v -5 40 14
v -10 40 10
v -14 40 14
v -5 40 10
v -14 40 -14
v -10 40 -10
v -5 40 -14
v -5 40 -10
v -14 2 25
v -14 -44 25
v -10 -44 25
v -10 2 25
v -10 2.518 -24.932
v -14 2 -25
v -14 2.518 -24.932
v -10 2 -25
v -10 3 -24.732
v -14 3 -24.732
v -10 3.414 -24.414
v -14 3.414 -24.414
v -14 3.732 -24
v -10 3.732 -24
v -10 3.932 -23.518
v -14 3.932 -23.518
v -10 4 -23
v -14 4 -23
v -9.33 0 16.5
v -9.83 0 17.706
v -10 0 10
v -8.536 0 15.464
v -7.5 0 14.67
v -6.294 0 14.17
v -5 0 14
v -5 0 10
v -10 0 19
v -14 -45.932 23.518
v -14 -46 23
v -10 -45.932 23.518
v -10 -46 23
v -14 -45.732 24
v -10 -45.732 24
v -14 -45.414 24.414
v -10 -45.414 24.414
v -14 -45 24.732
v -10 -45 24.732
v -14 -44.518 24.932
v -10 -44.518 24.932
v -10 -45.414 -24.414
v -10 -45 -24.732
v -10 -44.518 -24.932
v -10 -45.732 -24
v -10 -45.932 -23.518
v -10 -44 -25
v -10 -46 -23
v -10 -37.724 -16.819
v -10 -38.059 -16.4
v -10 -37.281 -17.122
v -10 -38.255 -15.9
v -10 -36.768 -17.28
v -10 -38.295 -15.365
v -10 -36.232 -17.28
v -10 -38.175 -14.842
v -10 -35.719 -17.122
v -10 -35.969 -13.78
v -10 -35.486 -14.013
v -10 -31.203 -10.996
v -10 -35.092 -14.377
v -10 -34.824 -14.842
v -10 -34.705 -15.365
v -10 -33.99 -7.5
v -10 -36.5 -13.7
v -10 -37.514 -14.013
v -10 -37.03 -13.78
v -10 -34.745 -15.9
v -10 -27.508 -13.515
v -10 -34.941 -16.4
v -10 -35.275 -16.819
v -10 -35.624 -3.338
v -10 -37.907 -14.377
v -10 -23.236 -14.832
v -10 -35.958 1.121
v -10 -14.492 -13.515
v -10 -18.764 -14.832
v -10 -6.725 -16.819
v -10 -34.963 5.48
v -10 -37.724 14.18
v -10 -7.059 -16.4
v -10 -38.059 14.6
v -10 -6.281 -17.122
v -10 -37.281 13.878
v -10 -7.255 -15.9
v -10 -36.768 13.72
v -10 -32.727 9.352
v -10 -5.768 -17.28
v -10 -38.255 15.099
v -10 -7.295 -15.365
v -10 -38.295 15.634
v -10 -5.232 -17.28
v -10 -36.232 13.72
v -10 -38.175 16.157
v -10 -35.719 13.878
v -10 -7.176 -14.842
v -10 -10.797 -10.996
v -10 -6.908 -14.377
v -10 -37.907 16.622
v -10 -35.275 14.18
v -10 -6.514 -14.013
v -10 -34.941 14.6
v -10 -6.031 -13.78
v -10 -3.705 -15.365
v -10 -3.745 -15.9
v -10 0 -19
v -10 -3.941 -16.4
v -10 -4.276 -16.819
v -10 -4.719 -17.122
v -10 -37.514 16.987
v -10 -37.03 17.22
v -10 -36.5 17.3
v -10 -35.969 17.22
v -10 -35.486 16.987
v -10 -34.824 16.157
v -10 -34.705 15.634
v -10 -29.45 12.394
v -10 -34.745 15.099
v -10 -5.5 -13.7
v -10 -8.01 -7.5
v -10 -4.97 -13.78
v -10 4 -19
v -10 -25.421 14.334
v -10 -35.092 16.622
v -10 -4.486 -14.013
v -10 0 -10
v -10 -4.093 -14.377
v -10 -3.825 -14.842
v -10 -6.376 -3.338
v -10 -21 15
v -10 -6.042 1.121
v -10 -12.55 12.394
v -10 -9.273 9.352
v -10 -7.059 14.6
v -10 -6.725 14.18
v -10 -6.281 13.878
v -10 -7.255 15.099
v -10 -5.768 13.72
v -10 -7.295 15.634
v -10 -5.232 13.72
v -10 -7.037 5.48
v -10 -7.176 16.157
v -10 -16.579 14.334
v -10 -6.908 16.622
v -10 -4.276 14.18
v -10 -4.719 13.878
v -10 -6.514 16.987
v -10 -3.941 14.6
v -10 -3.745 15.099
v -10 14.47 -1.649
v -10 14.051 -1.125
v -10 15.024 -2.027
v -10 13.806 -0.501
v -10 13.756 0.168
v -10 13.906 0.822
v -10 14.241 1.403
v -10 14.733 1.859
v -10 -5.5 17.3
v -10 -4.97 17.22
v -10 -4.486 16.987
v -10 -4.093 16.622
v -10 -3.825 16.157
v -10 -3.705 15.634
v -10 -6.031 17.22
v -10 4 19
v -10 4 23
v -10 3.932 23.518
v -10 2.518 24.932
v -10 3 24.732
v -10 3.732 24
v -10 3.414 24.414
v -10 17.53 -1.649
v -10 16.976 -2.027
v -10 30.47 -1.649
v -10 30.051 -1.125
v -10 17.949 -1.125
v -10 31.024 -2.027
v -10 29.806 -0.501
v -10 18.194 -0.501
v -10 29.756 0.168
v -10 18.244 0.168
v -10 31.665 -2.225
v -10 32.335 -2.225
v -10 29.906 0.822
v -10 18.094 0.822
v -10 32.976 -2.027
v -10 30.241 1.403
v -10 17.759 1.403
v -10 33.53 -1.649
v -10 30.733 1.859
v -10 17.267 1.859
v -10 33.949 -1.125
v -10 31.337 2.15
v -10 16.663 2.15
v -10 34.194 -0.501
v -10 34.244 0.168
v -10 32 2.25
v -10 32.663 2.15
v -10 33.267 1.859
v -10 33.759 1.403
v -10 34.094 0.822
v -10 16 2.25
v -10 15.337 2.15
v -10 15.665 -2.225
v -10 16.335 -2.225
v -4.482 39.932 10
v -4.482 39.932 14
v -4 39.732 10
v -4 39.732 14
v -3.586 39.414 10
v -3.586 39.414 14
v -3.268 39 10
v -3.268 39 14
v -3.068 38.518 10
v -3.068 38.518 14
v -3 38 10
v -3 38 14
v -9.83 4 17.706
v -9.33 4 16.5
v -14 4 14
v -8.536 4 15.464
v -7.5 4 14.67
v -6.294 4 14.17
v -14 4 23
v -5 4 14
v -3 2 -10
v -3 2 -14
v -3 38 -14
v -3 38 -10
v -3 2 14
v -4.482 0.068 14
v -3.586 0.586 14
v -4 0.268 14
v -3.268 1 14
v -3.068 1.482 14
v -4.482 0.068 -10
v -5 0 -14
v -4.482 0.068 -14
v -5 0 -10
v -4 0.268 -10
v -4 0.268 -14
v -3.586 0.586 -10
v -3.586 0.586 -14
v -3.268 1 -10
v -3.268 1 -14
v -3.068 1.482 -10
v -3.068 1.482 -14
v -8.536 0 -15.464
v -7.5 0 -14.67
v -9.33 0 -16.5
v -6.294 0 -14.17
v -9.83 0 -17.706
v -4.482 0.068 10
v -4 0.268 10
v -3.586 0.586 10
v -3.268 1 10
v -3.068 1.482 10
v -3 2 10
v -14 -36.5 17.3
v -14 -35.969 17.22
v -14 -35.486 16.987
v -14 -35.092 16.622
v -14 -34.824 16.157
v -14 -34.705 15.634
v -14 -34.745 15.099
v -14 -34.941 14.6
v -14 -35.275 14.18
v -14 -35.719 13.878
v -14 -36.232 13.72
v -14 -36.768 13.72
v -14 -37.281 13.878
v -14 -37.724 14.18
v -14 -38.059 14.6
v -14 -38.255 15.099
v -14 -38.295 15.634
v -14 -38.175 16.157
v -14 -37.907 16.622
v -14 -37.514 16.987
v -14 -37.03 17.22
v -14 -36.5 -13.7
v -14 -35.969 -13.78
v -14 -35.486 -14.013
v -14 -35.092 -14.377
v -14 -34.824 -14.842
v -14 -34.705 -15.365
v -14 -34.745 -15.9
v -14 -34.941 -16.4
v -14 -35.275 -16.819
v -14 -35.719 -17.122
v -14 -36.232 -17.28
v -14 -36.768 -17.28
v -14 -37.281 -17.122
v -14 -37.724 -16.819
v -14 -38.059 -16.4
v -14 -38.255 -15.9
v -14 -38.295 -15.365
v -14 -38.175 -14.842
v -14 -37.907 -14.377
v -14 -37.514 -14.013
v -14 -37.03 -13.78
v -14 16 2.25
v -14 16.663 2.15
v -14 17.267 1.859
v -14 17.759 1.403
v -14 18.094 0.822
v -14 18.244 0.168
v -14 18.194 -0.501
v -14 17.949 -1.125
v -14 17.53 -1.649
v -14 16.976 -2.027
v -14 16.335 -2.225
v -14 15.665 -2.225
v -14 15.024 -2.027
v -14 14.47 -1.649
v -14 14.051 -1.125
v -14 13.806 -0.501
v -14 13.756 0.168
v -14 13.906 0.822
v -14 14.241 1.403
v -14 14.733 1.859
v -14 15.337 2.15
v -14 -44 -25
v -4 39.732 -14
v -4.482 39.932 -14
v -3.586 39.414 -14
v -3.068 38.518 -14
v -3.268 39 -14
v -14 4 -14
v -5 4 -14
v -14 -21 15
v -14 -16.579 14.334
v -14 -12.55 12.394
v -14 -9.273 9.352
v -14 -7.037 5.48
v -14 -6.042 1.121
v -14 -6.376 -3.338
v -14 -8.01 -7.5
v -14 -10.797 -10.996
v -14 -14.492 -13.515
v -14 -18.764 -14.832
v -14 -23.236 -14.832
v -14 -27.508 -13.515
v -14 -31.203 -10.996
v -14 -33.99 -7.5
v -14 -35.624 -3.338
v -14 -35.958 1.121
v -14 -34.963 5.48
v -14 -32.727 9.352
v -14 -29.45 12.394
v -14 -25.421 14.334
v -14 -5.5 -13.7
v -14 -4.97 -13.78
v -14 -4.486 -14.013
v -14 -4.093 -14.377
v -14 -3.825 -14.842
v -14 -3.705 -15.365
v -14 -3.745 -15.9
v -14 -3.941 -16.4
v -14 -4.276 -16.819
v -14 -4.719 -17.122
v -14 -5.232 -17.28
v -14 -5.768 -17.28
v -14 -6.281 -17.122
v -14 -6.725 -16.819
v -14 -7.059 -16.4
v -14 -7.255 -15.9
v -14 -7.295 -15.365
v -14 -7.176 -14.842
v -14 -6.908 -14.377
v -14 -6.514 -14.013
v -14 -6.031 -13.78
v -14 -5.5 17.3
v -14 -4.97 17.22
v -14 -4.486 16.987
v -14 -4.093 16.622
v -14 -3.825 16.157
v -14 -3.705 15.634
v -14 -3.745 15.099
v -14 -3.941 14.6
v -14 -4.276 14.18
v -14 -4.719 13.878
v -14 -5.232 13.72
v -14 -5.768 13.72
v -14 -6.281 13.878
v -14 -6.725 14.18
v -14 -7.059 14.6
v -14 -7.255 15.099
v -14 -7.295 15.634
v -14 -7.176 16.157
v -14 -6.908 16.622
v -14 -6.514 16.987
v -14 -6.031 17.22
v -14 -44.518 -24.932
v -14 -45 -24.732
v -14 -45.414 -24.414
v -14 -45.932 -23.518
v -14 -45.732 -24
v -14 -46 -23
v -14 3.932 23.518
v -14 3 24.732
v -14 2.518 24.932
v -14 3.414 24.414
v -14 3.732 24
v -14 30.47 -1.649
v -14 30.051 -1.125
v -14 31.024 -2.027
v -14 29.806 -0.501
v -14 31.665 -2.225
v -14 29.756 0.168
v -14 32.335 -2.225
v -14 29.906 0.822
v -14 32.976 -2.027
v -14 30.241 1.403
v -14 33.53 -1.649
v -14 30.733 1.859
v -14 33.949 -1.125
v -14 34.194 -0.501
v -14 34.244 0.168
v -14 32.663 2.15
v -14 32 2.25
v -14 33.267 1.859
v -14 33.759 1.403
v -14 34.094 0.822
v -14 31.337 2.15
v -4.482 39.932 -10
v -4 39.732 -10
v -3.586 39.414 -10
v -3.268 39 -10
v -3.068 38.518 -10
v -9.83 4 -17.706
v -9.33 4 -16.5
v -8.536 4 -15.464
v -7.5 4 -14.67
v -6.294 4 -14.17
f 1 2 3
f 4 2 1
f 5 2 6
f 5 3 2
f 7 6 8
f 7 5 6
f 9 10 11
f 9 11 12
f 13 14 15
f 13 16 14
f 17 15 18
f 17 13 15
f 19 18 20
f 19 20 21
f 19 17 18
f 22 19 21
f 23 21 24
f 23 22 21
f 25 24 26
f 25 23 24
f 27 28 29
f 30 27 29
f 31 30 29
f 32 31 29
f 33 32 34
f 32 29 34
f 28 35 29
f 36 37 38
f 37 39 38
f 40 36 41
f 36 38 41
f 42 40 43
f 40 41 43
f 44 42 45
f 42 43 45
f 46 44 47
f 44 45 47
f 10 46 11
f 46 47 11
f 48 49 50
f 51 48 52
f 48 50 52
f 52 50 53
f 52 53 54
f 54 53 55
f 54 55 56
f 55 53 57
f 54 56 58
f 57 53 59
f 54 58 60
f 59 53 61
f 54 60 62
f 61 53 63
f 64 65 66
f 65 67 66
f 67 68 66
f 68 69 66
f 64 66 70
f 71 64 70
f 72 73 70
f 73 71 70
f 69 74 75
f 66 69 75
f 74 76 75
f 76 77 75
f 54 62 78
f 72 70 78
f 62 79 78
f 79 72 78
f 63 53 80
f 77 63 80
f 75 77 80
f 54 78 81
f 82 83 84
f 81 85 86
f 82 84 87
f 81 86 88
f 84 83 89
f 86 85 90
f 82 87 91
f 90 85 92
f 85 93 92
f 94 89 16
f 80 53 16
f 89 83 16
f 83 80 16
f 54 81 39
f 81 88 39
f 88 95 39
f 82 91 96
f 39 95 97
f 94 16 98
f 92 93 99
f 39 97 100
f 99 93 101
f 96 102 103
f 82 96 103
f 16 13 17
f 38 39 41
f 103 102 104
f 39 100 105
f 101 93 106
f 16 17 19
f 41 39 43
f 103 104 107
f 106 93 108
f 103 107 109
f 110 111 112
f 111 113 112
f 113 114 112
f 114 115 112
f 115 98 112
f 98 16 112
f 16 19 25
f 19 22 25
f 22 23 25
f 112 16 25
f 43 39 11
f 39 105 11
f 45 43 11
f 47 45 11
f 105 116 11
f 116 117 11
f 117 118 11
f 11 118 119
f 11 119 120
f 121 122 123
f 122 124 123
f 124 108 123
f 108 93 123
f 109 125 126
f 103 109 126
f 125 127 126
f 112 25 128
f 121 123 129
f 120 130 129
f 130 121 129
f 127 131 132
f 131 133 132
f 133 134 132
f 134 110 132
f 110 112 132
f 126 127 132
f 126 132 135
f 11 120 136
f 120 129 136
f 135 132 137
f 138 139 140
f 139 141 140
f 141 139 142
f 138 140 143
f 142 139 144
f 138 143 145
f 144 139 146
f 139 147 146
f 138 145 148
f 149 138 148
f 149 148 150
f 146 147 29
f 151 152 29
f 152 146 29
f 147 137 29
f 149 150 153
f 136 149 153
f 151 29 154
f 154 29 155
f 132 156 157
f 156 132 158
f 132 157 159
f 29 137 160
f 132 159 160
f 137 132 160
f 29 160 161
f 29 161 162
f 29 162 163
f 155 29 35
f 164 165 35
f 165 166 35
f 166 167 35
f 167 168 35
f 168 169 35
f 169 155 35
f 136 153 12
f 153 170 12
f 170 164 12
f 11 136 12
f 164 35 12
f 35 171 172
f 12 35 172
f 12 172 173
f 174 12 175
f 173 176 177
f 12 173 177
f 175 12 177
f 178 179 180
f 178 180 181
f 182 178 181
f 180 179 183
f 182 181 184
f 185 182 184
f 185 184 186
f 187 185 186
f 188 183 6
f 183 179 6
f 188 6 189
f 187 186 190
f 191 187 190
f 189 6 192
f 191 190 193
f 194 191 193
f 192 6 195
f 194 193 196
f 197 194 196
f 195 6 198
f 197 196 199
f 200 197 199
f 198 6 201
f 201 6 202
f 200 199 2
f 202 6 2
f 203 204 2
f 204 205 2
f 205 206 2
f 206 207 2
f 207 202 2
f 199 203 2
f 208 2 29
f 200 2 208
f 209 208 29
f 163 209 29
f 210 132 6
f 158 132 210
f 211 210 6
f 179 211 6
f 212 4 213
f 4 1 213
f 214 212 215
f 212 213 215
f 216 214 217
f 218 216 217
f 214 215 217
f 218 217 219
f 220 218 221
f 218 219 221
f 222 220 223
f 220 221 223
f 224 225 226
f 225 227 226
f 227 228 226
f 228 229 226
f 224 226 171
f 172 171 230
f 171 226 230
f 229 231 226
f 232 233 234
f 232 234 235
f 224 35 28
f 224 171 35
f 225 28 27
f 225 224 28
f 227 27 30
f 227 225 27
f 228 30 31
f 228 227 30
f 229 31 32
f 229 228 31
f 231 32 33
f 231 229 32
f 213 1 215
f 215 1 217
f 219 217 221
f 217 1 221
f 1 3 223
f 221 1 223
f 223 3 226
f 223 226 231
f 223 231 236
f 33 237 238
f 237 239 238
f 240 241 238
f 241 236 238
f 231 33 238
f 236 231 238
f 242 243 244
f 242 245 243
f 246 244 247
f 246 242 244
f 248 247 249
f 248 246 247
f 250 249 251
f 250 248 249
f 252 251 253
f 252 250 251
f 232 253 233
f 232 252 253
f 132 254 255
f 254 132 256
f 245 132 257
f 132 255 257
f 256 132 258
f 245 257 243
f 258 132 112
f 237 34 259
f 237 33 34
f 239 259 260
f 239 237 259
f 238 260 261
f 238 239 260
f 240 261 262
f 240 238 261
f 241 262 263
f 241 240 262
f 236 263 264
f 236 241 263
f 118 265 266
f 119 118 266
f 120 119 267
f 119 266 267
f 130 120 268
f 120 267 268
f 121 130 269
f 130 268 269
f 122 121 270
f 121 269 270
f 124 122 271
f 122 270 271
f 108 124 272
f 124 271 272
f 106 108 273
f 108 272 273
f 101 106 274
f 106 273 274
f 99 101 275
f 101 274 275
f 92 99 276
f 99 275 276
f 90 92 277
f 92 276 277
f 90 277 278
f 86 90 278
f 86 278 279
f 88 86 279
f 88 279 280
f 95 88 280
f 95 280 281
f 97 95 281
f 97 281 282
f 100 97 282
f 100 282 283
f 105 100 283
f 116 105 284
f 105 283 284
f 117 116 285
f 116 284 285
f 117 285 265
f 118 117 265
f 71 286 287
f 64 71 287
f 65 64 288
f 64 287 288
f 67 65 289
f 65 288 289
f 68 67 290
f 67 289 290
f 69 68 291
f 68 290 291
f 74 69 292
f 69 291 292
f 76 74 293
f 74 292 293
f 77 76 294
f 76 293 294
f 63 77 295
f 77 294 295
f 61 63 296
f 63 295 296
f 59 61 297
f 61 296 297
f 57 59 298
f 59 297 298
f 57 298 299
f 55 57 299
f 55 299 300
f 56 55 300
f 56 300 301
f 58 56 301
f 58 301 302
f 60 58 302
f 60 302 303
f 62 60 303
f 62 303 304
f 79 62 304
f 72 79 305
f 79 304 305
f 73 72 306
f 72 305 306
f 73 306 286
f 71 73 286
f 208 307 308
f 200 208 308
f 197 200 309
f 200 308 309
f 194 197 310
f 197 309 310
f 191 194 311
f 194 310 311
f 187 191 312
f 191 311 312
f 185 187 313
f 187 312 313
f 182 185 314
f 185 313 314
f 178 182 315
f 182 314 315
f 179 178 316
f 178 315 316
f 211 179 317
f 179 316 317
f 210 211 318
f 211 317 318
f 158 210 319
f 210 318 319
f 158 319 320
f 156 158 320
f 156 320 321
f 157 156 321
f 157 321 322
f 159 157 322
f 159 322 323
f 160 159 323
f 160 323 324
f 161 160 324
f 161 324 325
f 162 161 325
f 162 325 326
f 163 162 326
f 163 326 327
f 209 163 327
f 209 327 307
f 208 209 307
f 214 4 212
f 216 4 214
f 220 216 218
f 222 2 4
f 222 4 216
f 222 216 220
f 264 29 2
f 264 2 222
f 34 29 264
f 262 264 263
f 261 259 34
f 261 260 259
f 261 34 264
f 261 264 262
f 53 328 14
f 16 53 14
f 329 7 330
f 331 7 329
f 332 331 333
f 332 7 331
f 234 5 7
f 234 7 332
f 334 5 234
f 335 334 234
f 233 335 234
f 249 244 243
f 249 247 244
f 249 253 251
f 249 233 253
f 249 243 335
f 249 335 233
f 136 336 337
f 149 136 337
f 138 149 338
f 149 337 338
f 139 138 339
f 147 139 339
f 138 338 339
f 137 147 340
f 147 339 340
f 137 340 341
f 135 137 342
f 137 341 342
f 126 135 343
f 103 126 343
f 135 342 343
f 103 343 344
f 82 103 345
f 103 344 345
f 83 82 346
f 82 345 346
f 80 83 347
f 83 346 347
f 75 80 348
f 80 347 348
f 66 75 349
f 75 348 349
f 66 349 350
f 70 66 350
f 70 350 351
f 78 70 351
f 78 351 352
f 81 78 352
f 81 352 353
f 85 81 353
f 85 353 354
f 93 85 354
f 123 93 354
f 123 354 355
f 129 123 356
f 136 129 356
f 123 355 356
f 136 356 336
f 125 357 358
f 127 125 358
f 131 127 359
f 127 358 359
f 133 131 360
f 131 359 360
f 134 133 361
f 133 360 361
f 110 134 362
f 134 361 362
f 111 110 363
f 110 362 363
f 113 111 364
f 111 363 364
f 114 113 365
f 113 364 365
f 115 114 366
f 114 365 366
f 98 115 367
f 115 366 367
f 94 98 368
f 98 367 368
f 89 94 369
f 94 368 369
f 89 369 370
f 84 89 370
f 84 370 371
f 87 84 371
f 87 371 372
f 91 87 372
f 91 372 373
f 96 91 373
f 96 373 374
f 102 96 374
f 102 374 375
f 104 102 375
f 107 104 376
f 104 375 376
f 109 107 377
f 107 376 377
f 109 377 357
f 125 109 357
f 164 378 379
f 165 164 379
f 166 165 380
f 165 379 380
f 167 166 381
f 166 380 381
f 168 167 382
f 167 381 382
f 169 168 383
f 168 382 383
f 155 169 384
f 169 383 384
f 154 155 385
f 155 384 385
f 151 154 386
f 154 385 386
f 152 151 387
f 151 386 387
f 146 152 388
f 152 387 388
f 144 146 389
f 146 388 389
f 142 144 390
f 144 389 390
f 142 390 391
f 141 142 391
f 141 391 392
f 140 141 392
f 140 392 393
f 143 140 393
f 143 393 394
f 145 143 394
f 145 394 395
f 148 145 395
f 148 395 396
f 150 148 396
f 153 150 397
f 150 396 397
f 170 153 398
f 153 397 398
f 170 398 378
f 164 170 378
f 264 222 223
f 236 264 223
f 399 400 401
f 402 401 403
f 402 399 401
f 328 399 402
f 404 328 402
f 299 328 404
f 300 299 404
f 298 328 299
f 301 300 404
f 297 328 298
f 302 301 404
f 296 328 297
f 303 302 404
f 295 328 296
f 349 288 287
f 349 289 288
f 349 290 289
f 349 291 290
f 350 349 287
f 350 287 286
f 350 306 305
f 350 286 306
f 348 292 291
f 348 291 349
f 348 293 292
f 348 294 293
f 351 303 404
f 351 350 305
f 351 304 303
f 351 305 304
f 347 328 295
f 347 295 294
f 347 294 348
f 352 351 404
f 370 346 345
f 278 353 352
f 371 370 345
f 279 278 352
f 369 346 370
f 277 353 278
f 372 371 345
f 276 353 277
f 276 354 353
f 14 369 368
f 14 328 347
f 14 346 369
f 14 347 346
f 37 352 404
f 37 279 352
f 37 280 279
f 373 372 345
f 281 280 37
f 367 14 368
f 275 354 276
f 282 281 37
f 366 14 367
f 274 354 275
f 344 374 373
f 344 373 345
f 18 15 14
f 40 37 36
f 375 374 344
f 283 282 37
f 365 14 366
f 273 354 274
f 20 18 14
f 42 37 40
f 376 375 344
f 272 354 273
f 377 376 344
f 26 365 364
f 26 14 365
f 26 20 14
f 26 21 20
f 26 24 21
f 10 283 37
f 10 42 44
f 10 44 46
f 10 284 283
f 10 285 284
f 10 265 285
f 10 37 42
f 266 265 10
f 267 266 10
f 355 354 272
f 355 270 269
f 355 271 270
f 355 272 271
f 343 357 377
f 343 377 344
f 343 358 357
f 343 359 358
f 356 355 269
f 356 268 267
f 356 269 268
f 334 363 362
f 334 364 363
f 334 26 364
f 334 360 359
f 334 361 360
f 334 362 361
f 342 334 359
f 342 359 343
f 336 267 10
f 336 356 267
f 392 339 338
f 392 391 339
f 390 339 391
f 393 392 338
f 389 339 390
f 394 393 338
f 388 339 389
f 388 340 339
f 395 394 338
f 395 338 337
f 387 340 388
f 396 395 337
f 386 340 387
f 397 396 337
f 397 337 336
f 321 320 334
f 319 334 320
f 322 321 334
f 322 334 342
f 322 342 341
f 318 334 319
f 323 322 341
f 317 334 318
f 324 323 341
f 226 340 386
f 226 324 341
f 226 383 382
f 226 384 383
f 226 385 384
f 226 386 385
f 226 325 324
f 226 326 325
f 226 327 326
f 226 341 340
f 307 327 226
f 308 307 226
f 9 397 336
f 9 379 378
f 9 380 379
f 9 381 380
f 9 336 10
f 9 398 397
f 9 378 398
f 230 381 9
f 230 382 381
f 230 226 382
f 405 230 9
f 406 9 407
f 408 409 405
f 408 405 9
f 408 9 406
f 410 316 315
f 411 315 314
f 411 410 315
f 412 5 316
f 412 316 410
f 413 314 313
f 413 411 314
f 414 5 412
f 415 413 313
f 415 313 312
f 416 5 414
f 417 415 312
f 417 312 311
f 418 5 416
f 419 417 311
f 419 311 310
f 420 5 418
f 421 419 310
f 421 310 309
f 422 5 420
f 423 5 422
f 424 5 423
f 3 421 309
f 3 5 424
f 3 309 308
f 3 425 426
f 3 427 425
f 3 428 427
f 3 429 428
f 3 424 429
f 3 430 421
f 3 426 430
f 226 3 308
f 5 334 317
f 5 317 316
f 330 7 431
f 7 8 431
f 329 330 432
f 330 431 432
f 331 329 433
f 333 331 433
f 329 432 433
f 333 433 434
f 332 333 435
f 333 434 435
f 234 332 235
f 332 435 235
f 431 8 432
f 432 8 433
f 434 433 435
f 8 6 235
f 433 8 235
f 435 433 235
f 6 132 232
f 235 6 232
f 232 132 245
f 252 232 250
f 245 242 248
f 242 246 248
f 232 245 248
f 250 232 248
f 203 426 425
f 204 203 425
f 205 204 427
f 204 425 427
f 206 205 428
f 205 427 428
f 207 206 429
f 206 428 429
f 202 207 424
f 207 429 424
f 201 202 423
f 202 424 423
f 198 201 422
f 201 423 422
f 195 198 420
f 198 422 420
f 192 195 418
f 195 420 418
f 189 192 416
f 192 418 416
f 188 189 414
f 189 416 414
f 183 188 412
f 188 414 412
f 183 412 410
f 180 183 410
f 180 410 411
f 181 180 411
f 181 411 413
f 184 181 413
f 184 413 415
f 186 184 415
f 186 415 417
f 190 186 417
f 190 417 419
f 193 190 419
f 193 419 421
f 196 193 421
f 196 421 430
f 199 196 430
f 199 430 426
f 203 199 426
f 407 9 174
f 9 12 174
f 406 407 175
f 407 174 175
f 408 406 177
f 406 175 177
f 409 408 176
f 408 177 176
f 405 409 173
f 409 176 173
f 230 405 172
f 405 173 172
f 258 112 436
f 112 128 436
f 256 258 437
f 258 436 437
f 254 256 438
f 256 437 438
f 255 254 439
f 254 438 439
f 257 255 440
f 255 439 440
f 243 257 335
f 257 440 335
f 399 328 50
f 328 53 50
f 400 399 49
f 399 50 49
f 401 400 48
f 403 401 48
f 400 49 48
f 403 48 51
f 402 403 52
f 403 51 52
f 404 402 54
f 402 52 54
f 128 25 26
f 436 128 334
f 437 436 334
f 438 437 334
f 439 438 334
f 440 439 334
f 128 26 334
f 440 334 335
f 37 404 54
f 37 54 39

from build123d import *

# Parameters (mm, degrees)
SKETCH1_W           = 28
SKETCH1_H           = 28
SKETCH1_W_2         = 20
SKETCH1_H_2         = 20
BOSS_EXTRUDE1_DEPTH = 40
SKETCH2_R           = 2.25
CUT_EXTRUDE1_DEPTH  = 30
SKETCH5_W           = 50
SKETCH5_H           = 50
SKETCH5_R           = 1.8
SKETCH5_R_2         = 15
BOSS_EXTRUDE2_DEPTH = 4
SKETCH6_W           = 17
SKETCH6_H           = 28
CUT_EXTRUDE2_DEPTH  = 40
FILLET1_R           = 2
FILLET2_R           = 5


with BuildPart() as part:
    # Sketch1 → Boss-Extrude1 (new body)
    with BuildSketch(Plane(origin=(0, 0, 0), x_dir=(1, 0, 0), z_dir=(0, 1, 0))):
        Rectangle(SKETCH1_W, SKETCH1_H)
        Rectangle(SKETCH1_W_2, SKETCH1_H_2, mode=Mode.SUBTRACT)
    extrude(amount=BOSS_EXTRUDE1_DEPTH)

    # Sketch2 → Cut-Extrude1 (cut)
    with BuildSketch(Plane.ZY.offset(14)):
        with Locations((0, 32)):
            Circle(SKETCH2_R)
        with Locations((0, 16)):
            Circle(SKETCH2_R)
    extrude(amount=-CUT_EXTRUDE1_DEPTH, mode=Mode.SUBTRACT)

    # Sketch5 → Boss-Extrude2 (add)
    with BuildSketch(Plane.ZY.offset(14)):
        with Locations((0, -21)):
            Rectangle(SKETCH5_W, SKETCH5_H)
        with Locations((-15.499780644, -5.500219356)):
            Circle(SKETCH5_R, mode=Mode.SUBTRACT)
        with Locations((15.499780644, -5.500219356)):
            Circle(SKETCH5_R, mode=Mode.SUBTRACT)
        with Locations((15.499780644, -36.499780644)):
            Circle(SKETCH5_R, mode=Mode.SUBTRACT)
        with Locations((-15.499780644, -36.499780644)):
            Circle(SKETCH5_R, mode=Mode.SUBTRACT)
        with Locations((0, -21)):
            Circle(SKETCH5_R_2, mode=Mode.SUBTRACT)
    extrude(amount=-BOSS_EXTRUDE2_DEPTH)

    # Sketch6 → Cut-Extrude2 (cut)
    with BuildSketch(Plane.XZ):
        with Locations((5.5, 0)):
            Rectangle(SKETCH6_W, SKETCH6_H)
    extrude(amount=-CUT_EXTRUDE2_DEPTH, mode=Mode.SUBTRACT)

    # Fillet1
    fillet1_edges = [part.edges().sort_by_distance(p)[0] for p in [
        (-3, 0, -12),
        (-3, 0, 12),
        (-12, 4, 25),
        (-12, -46, 25),
        (-12, -46, -25),
        (-12, 4, -25),
        (-3, 40, -12),
        (-3, 40, 12),
    ]]
    fillet(fillet1_edges, radius=FILLET1_R)

    # Fillet2
    fillet2_edges = [part.edges().sort_by_distance(p)[0] for p in [
        (-10, 2, -14),
        (-10, 2, 14),
    ]]
    fillet(fillet2_edges, radius=FILLET2_R)


solid = part.part
